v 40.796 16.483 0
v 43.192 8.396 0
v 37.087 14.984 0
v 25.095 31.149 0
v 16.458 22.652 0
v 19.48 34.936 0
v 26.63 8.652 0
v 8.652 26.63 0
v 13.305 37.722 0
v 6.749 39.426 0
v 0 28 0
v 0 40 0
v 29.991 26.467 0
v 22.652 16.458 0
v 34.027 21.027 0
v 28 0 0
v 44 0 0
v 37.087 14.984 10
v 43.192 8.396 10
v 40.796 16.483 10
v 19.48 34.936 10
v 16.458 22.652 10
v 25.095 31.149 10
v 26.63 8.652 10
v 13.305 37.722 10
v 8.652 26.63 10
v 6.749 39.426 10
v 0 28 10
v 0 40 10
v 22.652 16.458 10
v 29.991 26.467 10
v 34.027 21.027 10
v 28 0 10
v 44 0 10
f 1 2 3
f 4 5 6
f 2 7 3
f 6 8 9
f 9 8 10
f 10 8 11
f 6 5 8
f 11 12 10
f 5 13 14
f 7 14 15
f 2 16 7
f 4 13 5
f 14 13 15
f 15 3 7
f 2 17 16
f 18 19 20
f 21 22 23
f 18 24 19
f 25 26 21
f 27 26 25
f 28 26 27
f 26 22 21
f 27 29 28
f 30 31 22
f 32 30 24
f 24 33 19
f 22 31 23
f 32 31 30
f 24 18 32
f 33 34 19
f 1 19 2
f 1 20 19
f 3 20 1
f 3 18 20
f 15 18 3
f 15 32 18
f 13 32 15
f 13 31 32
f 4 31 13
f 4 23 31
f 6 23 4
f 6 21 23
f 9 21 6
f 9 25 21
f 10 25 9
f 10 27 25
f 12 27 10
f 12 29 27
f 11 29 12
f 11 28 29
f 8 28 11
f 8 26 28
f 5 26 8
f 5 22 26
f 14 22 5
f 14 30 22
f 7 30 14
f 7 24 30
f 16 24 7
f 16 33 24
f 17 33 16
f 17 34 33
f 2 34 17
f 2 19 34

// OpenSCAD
$fn = 32;

// ----------------------------------------------------------------------
// Arc stop: segment, 10 mm thick
// ----------------------------------------------------------------------

// --- parameters (mm) ---
profile_height = 10;      // extrusion height
profile_points = 17;      // points of the closed outline

profile = [[44, 0], [43.192, 8.396], [40.796, 16.483], [37.087, 14.984], [34.027, 21.027], [29.991, 26.467], [25.095, 31.149], [19.48, 34.936], [13.305, 37.722], [6.749, 39.426], [0, 40], [0, 28], [8.652, 26.63], [16.458, 22.652], [22.652, 16.458], [26.63, 8.652], [28, 0]];  // single closed polygon, 17 points, counter clockwise

// --- the one profile operation ---
linear_extrude(height = profile_height) polygon(points = profile);
